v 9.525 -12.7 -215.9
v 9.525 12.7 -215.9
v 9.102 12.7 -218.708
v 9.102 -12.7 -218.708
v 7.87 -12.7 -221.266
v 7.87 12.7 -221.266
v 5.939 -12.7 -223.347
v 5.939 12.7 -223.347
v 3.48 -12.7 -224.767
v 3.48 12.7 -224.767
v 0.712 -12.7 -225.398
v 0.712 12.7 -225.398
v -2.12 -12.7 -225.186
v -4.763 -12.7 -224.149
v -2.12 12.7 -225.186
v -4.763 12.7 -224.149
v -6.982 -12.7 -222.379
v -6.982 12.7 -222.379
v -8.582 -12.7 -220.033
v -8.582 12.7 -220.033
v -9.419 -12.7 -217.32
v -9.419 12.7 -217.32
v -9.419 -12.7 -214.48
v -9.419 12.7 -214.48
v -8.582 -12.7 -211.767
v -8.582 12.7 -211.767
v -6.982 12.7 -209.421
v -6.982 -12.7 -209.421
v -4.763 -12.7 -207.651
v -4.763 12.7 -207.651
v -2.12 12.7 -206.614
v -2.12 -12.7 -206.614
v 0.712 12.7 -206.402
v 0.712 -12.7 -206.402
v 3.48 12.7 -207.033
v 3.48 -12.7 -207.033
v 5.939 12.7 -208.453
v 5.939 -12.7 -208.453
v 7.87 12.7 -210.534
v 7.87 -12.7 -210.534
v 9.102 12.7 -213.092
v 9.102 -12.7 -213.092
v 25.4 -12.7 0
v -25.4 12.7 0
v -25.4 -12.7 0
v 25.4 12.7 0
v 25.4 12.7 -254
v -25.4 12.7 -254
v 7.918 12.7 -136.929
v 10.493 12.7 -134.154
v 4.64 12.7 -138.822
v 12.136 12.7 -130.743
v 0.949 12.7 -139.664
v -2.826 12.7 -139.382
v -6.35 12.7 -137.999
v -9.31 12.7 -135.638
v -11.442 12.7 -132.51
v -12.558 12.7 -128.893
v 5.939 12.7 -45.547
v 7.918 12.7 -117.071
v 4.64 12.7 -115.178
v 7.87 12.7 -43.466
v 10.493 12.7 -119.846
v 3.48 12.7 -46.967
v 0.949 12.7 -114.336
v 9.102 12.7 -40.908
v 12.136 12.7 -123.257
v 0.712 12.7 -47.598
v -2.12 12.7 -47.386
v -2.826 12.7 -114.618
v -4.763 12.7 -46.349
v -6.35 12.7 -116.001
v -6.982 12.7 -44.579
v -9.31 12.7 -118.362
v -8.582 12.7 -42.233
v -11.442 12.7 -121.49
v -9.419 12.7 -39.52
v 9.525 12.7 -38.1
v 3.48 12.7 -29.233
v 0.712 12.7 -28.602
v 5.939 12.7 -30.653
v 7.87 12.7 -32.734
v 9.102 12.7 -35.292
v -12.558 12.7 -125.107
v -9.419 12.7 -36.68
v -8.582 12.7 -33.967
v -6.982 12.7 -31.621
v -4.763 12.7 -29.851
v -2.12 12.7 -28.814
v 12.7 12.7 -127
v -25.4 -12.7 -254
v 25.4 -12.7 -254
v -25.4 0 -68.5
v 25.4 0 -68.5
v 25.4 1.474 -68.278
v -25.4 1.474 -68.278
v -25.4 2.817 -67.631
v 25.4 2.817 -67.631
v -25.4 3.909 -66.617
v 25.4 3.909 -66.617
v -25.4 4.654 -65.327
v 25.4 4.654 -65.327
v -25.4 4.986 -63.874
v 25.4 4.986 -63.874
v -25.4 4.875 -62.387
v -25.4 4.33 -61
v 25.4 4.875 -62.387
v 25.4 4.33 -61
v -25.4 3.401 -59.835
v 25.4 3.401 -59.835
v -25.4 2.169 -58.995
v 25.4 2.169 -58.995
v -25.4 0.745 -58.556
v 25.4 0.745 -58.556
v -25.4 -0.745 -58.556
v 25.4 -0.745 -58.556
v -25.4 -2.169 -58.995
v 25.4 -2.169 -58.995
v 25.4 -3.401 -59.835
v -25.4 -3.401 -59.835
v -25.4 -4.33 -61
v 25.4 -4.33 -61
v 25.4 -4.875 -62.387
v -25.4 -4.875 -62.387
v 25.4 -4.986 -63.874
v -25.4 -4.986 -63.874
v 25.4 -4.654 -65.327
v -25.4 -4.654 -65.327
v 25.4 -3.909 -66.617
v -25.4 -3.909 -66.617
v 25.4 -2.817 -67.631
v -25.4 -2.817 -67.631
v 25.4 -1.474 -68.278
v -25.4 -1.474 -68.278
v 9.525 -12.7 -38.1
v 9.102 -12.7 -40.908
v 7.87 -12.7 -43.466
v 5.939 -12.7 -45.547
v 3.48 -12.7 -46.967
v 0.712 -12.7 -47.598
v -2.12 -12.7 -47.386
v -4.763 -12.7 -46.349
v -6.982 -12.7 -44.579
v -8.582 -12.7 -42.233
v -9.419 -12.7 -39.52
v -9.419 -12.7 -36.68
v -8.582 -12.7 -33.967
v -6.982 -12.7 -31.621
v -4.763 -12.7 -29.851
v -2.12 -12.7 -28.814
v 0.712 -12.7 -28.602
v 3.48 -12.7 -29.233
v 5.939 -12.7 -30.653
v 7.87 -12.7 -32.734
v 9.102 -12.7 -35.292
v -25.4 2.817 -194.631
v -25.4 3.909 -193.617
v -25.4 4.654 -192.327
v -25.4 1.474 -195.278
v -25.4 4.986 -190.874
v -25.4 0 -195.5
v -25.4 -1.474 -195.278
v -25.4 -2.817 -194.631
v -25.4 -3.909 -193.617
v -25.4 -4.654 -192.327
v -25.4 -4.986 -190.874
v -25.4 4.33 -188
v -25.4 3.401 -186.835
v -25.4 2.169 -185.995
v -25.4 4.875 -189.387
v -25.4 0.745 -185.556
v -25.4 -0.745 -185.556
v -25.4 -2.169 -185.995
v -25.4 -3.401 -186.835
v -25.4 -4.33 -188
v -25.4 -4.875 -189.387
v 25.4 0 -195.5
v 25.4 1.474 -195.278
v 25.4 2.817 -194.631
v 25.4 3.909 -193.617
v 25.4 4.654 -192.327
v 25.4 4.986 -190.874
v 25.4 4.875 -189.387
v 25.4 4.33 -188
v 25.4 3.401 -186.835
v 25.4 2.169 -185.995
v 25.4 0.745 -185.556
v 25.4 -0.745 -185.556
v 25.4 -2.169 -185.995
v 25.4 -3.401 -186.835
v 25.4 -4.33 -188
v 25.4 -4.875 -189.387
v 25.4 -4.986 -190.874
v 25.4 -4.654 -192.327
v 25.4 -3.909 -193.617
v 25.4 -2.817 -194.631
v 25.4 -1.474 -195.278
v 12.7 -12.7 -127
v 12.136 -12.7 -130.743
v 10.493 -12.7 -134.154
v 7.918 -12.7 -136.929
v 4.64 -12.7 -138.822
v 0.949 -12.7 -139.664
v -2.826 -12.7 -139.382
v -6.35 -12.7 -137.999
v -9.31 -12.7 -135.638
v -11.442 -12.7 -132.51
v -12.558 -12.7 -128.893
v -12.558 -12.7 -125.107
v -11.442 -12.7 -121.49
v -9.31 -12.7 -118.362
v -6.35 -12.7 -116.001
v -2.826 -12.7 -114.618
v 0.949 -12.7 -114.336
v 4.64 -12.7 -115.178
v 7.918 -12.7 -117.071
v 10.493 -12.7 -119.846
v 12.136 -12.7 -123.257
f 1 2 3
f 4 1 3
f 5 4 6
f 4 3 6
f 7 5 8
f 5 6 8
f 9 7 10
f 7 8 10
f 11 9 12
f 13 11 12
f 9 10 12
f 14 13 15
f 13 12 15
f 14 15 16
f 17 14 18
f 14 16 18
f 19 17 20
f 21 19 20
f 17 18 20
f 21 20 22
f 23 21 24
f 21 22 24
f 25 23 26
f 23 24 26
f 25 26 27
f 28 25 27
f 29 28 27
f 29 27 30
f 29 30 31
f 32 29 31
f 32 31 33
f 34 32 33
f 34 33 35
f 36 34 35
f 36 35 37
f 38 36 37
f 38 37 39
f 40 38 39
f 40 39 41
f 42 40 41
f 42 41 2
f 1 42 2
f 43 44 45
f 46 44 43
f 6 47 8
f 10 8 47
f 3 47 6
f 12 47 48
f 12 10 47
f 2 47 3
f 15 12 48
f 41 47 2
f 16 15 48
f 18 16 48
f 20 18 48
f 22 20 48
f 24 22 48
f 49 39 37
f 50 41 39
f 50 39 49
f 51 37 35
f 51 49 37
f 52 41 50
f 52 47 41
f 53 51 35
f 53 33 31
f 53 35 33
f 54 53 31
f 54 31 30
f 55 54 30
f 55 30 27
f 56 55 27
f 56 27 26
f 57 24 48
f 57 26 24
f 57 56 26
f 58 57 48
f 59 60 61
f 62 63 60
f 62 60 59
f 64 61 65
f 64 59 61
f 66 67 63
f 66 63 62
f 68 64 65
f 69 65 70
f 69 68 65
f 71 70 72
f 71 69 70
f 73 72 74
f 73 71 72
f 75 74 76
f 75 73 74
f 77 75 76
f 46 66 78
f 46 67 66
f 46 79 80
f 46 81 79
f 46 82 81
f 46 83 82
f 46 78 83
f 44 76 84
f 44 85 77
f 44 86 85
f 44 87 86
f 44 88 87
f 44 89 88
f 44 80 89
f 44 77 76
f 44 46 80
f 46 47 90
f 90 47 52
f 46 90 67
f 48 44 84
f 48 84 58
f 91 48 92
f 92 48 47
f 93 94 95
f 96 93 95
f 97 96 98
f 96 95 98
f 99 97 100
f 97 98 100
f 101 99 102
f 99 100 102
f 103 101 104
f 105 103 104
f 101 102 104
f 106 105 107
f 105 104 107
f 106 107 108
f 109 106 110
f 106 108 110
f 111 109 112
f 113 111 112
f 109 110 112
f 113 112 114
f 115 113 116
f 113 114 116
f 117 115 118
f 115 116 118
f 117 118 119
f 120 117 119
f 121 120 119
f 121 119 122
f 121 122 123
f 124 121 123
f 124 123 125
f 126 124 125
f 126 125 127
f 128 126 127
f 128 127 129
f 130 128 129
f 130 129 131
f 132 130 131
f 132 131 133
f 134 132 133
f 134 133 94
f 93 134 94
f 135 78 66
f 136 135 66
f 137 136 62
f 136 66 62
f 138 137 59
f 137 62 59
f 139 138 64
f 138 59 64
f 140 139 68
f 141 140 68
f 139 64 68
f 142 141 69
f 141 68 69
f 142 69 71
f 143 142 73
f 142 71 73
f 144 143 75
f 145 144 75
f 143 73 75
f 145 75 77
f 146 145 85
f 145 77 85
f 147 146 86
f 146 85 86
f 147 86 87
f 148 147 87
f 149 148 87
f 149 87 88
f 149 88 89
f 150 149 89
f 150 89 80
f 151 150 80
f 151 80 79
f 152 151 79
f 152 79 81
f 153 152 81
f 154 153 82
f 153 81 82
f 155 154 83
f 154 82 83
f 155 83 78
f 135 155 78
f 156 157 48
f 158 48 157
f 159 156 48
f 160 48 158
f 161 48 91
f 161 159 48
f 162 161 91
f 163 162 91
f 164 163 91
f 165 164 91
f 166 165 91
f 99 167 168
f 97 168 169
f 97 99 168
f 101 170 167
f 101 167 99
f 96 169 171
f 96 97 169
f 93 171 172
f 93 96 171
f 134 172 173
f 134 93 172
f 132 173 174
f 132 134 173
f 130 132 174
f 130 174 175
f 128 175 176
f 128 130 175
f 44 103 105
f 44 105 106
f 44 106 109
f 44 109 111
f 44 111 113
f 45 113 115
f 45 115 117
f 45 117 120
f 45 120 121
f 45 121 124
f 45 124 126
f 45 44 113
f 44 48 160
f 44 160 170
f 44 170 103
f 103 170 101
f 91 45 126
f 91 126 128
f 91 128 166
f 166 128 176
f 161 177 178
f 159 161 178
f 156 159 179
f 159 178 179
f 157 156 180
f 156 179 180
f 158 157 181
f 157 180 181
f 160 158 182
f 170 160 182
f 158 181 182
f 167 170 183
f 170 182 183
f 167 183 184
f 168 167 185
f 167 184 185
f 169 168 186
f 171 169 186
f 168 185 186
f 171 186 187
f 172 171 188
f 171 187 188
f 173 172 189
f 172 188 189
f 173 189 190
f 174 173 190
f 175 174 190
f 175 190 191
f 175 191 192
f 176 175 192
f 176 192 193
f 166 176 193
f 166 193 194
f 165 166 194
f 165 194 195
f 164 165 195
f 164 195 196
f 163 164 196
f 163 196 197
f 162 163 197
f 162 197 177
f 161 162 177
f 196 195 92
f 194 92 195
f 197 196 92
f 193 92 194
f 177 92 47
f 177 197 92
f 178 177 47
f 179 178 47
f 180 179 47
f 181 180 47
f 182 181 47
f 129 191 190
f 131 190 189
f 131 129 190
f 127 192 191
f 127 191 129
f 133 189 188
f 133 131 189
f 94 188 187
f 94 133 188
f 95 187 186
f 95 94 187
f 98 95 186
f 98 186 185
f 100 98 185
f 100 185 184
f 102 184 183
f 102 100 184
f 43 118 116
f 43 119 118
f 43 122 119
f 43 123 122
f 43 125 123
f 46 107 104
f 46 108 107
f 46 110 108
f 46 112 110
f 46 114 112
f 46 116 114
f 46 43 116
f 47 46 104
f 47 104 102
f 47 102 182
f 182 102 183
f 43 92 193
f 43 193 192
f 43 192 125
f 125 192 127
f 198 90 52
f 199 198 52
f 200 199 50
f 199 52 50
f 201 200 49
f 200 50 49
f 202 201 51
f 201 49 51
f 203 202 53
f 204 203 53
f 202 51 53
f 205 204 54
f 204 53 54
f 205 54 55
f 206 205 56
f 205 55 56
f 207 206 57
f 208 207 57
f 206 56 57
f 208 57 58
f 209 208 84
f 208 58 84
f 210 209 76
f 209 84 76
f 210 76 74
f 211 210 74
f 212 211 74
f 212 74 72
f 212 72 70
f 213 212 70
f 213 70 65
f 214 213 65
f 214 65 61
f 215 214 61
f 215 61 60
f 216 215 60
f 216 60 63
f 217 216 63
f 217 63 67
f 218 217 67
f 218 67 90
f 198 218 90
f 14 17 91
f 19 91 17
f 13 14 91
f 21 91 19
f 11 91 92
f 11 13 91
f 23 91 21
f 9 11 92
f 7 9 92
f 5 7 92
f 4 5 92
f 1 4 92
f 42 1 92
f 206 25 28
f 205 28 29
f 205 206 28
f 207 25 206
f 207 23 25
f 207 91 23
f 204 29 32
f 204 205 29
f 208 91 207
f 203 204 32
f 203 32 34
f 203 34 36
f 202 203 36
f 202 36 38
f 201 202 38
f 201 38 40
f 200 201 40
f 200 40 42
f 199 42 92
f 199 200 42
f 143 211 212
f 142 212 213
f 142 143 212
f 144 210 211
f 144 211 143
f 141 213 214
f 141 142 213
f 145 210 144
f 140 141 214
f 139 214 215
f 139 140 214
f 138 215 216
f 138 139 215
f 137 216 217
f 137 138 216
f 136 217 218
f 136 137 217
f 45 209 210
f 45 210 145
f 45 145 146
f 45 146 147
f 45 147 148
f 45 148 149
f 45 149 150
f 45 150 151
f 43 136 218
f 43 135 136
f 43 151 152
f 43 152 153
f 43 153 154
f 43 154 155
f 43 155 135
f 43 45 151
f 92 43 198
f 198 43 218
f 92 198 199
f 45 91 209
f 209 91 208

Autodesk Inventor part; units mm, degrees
ref_plane "YZ Plane" through (0, 0, 0) normal (1, 0, 0) x (0, 1, 0)
ref_plane "XZ Plane" through (0, 0, 0) normal (0, 1, 0) x (-1, 0, 0)
ref_plane "XY Plane" through (0, 0, 0) normal (0, 0, 1) x (1, 0, 0)
sketch "Sketch1" plane through (0, 0, 0) normal (0, 0, 1) x (1, 0, 0)
  line L0 (-25.4, -12.7) -> (25.4, -12.7)
  line L1 (25.4, -12.7) -> (25.4, 12.7)
  line L2 (25.4, 12.7) -> (-25.4, 12.7)
  line L3 (-25.4, 12.7) -> (-25.4, -12.7)
  line L4 (-25.4, -12.7) -> (25.4, 12.7) construction
  line L5 (25.4, -12.7) -> (-25.4, 12.7) construction
  point P0 (0, 0)
  dimension "d0" = 25.4
  dimension "d1" = 50.8
extrude "Extrusion1" add sketch "Sketch1" against normal blind 254
sketch "Sketch2" plane through (-25.4, 12.7, 0) normal (0, 1, 0) x (1, 0, 0)
  circle A0 centre (25.4, 38.1) radius 9.525
  circle A1 centre (25.4, 215.9) radius 9.525
  line L0 (50.8, 0) -> (0, 0) projected
  line L1 (0, 0) -> (0, 254) projected
  circle A2 centre (25.4, 127) radius 12.7
  point P0 (25.4, 0)
  point P1 (25.4, 0)
  point P2 (0, 127)
  point P3 (0, 127)
  dimension "d4" = 19.05
  dimension "d5" = 88.9
  dimension "d6" = 177.8
  dimension "d9" = 25.4
extrude "Extrusion2" cut sketch "Sketch2" against normal blind 254
sketch "Sketch3" plane through (25.4, -12.7, 0) normal (1, 0, 0) x (0, 0, -1)
  circle A0 centre (63.5, 12.7) radius 5
  circle A1 centre (190.5, 12.7) radius 5
  line L0 (0, 25.4) -> (254, 25.4) projected
  line L1 (0, 0) -> (0, 25.4) projected
  point P0 (0, 12.7)
  point P1 (127, 25.4)
  point P2 (0, 12.7)
  dimension "d10" = 10
  dimension "d11" = 127
  dimension "d12" = 63.5
extrude "Extrusion3" cut sketch "Sketch3" against normal blind 254
properties part number "Metal Bar-2"
